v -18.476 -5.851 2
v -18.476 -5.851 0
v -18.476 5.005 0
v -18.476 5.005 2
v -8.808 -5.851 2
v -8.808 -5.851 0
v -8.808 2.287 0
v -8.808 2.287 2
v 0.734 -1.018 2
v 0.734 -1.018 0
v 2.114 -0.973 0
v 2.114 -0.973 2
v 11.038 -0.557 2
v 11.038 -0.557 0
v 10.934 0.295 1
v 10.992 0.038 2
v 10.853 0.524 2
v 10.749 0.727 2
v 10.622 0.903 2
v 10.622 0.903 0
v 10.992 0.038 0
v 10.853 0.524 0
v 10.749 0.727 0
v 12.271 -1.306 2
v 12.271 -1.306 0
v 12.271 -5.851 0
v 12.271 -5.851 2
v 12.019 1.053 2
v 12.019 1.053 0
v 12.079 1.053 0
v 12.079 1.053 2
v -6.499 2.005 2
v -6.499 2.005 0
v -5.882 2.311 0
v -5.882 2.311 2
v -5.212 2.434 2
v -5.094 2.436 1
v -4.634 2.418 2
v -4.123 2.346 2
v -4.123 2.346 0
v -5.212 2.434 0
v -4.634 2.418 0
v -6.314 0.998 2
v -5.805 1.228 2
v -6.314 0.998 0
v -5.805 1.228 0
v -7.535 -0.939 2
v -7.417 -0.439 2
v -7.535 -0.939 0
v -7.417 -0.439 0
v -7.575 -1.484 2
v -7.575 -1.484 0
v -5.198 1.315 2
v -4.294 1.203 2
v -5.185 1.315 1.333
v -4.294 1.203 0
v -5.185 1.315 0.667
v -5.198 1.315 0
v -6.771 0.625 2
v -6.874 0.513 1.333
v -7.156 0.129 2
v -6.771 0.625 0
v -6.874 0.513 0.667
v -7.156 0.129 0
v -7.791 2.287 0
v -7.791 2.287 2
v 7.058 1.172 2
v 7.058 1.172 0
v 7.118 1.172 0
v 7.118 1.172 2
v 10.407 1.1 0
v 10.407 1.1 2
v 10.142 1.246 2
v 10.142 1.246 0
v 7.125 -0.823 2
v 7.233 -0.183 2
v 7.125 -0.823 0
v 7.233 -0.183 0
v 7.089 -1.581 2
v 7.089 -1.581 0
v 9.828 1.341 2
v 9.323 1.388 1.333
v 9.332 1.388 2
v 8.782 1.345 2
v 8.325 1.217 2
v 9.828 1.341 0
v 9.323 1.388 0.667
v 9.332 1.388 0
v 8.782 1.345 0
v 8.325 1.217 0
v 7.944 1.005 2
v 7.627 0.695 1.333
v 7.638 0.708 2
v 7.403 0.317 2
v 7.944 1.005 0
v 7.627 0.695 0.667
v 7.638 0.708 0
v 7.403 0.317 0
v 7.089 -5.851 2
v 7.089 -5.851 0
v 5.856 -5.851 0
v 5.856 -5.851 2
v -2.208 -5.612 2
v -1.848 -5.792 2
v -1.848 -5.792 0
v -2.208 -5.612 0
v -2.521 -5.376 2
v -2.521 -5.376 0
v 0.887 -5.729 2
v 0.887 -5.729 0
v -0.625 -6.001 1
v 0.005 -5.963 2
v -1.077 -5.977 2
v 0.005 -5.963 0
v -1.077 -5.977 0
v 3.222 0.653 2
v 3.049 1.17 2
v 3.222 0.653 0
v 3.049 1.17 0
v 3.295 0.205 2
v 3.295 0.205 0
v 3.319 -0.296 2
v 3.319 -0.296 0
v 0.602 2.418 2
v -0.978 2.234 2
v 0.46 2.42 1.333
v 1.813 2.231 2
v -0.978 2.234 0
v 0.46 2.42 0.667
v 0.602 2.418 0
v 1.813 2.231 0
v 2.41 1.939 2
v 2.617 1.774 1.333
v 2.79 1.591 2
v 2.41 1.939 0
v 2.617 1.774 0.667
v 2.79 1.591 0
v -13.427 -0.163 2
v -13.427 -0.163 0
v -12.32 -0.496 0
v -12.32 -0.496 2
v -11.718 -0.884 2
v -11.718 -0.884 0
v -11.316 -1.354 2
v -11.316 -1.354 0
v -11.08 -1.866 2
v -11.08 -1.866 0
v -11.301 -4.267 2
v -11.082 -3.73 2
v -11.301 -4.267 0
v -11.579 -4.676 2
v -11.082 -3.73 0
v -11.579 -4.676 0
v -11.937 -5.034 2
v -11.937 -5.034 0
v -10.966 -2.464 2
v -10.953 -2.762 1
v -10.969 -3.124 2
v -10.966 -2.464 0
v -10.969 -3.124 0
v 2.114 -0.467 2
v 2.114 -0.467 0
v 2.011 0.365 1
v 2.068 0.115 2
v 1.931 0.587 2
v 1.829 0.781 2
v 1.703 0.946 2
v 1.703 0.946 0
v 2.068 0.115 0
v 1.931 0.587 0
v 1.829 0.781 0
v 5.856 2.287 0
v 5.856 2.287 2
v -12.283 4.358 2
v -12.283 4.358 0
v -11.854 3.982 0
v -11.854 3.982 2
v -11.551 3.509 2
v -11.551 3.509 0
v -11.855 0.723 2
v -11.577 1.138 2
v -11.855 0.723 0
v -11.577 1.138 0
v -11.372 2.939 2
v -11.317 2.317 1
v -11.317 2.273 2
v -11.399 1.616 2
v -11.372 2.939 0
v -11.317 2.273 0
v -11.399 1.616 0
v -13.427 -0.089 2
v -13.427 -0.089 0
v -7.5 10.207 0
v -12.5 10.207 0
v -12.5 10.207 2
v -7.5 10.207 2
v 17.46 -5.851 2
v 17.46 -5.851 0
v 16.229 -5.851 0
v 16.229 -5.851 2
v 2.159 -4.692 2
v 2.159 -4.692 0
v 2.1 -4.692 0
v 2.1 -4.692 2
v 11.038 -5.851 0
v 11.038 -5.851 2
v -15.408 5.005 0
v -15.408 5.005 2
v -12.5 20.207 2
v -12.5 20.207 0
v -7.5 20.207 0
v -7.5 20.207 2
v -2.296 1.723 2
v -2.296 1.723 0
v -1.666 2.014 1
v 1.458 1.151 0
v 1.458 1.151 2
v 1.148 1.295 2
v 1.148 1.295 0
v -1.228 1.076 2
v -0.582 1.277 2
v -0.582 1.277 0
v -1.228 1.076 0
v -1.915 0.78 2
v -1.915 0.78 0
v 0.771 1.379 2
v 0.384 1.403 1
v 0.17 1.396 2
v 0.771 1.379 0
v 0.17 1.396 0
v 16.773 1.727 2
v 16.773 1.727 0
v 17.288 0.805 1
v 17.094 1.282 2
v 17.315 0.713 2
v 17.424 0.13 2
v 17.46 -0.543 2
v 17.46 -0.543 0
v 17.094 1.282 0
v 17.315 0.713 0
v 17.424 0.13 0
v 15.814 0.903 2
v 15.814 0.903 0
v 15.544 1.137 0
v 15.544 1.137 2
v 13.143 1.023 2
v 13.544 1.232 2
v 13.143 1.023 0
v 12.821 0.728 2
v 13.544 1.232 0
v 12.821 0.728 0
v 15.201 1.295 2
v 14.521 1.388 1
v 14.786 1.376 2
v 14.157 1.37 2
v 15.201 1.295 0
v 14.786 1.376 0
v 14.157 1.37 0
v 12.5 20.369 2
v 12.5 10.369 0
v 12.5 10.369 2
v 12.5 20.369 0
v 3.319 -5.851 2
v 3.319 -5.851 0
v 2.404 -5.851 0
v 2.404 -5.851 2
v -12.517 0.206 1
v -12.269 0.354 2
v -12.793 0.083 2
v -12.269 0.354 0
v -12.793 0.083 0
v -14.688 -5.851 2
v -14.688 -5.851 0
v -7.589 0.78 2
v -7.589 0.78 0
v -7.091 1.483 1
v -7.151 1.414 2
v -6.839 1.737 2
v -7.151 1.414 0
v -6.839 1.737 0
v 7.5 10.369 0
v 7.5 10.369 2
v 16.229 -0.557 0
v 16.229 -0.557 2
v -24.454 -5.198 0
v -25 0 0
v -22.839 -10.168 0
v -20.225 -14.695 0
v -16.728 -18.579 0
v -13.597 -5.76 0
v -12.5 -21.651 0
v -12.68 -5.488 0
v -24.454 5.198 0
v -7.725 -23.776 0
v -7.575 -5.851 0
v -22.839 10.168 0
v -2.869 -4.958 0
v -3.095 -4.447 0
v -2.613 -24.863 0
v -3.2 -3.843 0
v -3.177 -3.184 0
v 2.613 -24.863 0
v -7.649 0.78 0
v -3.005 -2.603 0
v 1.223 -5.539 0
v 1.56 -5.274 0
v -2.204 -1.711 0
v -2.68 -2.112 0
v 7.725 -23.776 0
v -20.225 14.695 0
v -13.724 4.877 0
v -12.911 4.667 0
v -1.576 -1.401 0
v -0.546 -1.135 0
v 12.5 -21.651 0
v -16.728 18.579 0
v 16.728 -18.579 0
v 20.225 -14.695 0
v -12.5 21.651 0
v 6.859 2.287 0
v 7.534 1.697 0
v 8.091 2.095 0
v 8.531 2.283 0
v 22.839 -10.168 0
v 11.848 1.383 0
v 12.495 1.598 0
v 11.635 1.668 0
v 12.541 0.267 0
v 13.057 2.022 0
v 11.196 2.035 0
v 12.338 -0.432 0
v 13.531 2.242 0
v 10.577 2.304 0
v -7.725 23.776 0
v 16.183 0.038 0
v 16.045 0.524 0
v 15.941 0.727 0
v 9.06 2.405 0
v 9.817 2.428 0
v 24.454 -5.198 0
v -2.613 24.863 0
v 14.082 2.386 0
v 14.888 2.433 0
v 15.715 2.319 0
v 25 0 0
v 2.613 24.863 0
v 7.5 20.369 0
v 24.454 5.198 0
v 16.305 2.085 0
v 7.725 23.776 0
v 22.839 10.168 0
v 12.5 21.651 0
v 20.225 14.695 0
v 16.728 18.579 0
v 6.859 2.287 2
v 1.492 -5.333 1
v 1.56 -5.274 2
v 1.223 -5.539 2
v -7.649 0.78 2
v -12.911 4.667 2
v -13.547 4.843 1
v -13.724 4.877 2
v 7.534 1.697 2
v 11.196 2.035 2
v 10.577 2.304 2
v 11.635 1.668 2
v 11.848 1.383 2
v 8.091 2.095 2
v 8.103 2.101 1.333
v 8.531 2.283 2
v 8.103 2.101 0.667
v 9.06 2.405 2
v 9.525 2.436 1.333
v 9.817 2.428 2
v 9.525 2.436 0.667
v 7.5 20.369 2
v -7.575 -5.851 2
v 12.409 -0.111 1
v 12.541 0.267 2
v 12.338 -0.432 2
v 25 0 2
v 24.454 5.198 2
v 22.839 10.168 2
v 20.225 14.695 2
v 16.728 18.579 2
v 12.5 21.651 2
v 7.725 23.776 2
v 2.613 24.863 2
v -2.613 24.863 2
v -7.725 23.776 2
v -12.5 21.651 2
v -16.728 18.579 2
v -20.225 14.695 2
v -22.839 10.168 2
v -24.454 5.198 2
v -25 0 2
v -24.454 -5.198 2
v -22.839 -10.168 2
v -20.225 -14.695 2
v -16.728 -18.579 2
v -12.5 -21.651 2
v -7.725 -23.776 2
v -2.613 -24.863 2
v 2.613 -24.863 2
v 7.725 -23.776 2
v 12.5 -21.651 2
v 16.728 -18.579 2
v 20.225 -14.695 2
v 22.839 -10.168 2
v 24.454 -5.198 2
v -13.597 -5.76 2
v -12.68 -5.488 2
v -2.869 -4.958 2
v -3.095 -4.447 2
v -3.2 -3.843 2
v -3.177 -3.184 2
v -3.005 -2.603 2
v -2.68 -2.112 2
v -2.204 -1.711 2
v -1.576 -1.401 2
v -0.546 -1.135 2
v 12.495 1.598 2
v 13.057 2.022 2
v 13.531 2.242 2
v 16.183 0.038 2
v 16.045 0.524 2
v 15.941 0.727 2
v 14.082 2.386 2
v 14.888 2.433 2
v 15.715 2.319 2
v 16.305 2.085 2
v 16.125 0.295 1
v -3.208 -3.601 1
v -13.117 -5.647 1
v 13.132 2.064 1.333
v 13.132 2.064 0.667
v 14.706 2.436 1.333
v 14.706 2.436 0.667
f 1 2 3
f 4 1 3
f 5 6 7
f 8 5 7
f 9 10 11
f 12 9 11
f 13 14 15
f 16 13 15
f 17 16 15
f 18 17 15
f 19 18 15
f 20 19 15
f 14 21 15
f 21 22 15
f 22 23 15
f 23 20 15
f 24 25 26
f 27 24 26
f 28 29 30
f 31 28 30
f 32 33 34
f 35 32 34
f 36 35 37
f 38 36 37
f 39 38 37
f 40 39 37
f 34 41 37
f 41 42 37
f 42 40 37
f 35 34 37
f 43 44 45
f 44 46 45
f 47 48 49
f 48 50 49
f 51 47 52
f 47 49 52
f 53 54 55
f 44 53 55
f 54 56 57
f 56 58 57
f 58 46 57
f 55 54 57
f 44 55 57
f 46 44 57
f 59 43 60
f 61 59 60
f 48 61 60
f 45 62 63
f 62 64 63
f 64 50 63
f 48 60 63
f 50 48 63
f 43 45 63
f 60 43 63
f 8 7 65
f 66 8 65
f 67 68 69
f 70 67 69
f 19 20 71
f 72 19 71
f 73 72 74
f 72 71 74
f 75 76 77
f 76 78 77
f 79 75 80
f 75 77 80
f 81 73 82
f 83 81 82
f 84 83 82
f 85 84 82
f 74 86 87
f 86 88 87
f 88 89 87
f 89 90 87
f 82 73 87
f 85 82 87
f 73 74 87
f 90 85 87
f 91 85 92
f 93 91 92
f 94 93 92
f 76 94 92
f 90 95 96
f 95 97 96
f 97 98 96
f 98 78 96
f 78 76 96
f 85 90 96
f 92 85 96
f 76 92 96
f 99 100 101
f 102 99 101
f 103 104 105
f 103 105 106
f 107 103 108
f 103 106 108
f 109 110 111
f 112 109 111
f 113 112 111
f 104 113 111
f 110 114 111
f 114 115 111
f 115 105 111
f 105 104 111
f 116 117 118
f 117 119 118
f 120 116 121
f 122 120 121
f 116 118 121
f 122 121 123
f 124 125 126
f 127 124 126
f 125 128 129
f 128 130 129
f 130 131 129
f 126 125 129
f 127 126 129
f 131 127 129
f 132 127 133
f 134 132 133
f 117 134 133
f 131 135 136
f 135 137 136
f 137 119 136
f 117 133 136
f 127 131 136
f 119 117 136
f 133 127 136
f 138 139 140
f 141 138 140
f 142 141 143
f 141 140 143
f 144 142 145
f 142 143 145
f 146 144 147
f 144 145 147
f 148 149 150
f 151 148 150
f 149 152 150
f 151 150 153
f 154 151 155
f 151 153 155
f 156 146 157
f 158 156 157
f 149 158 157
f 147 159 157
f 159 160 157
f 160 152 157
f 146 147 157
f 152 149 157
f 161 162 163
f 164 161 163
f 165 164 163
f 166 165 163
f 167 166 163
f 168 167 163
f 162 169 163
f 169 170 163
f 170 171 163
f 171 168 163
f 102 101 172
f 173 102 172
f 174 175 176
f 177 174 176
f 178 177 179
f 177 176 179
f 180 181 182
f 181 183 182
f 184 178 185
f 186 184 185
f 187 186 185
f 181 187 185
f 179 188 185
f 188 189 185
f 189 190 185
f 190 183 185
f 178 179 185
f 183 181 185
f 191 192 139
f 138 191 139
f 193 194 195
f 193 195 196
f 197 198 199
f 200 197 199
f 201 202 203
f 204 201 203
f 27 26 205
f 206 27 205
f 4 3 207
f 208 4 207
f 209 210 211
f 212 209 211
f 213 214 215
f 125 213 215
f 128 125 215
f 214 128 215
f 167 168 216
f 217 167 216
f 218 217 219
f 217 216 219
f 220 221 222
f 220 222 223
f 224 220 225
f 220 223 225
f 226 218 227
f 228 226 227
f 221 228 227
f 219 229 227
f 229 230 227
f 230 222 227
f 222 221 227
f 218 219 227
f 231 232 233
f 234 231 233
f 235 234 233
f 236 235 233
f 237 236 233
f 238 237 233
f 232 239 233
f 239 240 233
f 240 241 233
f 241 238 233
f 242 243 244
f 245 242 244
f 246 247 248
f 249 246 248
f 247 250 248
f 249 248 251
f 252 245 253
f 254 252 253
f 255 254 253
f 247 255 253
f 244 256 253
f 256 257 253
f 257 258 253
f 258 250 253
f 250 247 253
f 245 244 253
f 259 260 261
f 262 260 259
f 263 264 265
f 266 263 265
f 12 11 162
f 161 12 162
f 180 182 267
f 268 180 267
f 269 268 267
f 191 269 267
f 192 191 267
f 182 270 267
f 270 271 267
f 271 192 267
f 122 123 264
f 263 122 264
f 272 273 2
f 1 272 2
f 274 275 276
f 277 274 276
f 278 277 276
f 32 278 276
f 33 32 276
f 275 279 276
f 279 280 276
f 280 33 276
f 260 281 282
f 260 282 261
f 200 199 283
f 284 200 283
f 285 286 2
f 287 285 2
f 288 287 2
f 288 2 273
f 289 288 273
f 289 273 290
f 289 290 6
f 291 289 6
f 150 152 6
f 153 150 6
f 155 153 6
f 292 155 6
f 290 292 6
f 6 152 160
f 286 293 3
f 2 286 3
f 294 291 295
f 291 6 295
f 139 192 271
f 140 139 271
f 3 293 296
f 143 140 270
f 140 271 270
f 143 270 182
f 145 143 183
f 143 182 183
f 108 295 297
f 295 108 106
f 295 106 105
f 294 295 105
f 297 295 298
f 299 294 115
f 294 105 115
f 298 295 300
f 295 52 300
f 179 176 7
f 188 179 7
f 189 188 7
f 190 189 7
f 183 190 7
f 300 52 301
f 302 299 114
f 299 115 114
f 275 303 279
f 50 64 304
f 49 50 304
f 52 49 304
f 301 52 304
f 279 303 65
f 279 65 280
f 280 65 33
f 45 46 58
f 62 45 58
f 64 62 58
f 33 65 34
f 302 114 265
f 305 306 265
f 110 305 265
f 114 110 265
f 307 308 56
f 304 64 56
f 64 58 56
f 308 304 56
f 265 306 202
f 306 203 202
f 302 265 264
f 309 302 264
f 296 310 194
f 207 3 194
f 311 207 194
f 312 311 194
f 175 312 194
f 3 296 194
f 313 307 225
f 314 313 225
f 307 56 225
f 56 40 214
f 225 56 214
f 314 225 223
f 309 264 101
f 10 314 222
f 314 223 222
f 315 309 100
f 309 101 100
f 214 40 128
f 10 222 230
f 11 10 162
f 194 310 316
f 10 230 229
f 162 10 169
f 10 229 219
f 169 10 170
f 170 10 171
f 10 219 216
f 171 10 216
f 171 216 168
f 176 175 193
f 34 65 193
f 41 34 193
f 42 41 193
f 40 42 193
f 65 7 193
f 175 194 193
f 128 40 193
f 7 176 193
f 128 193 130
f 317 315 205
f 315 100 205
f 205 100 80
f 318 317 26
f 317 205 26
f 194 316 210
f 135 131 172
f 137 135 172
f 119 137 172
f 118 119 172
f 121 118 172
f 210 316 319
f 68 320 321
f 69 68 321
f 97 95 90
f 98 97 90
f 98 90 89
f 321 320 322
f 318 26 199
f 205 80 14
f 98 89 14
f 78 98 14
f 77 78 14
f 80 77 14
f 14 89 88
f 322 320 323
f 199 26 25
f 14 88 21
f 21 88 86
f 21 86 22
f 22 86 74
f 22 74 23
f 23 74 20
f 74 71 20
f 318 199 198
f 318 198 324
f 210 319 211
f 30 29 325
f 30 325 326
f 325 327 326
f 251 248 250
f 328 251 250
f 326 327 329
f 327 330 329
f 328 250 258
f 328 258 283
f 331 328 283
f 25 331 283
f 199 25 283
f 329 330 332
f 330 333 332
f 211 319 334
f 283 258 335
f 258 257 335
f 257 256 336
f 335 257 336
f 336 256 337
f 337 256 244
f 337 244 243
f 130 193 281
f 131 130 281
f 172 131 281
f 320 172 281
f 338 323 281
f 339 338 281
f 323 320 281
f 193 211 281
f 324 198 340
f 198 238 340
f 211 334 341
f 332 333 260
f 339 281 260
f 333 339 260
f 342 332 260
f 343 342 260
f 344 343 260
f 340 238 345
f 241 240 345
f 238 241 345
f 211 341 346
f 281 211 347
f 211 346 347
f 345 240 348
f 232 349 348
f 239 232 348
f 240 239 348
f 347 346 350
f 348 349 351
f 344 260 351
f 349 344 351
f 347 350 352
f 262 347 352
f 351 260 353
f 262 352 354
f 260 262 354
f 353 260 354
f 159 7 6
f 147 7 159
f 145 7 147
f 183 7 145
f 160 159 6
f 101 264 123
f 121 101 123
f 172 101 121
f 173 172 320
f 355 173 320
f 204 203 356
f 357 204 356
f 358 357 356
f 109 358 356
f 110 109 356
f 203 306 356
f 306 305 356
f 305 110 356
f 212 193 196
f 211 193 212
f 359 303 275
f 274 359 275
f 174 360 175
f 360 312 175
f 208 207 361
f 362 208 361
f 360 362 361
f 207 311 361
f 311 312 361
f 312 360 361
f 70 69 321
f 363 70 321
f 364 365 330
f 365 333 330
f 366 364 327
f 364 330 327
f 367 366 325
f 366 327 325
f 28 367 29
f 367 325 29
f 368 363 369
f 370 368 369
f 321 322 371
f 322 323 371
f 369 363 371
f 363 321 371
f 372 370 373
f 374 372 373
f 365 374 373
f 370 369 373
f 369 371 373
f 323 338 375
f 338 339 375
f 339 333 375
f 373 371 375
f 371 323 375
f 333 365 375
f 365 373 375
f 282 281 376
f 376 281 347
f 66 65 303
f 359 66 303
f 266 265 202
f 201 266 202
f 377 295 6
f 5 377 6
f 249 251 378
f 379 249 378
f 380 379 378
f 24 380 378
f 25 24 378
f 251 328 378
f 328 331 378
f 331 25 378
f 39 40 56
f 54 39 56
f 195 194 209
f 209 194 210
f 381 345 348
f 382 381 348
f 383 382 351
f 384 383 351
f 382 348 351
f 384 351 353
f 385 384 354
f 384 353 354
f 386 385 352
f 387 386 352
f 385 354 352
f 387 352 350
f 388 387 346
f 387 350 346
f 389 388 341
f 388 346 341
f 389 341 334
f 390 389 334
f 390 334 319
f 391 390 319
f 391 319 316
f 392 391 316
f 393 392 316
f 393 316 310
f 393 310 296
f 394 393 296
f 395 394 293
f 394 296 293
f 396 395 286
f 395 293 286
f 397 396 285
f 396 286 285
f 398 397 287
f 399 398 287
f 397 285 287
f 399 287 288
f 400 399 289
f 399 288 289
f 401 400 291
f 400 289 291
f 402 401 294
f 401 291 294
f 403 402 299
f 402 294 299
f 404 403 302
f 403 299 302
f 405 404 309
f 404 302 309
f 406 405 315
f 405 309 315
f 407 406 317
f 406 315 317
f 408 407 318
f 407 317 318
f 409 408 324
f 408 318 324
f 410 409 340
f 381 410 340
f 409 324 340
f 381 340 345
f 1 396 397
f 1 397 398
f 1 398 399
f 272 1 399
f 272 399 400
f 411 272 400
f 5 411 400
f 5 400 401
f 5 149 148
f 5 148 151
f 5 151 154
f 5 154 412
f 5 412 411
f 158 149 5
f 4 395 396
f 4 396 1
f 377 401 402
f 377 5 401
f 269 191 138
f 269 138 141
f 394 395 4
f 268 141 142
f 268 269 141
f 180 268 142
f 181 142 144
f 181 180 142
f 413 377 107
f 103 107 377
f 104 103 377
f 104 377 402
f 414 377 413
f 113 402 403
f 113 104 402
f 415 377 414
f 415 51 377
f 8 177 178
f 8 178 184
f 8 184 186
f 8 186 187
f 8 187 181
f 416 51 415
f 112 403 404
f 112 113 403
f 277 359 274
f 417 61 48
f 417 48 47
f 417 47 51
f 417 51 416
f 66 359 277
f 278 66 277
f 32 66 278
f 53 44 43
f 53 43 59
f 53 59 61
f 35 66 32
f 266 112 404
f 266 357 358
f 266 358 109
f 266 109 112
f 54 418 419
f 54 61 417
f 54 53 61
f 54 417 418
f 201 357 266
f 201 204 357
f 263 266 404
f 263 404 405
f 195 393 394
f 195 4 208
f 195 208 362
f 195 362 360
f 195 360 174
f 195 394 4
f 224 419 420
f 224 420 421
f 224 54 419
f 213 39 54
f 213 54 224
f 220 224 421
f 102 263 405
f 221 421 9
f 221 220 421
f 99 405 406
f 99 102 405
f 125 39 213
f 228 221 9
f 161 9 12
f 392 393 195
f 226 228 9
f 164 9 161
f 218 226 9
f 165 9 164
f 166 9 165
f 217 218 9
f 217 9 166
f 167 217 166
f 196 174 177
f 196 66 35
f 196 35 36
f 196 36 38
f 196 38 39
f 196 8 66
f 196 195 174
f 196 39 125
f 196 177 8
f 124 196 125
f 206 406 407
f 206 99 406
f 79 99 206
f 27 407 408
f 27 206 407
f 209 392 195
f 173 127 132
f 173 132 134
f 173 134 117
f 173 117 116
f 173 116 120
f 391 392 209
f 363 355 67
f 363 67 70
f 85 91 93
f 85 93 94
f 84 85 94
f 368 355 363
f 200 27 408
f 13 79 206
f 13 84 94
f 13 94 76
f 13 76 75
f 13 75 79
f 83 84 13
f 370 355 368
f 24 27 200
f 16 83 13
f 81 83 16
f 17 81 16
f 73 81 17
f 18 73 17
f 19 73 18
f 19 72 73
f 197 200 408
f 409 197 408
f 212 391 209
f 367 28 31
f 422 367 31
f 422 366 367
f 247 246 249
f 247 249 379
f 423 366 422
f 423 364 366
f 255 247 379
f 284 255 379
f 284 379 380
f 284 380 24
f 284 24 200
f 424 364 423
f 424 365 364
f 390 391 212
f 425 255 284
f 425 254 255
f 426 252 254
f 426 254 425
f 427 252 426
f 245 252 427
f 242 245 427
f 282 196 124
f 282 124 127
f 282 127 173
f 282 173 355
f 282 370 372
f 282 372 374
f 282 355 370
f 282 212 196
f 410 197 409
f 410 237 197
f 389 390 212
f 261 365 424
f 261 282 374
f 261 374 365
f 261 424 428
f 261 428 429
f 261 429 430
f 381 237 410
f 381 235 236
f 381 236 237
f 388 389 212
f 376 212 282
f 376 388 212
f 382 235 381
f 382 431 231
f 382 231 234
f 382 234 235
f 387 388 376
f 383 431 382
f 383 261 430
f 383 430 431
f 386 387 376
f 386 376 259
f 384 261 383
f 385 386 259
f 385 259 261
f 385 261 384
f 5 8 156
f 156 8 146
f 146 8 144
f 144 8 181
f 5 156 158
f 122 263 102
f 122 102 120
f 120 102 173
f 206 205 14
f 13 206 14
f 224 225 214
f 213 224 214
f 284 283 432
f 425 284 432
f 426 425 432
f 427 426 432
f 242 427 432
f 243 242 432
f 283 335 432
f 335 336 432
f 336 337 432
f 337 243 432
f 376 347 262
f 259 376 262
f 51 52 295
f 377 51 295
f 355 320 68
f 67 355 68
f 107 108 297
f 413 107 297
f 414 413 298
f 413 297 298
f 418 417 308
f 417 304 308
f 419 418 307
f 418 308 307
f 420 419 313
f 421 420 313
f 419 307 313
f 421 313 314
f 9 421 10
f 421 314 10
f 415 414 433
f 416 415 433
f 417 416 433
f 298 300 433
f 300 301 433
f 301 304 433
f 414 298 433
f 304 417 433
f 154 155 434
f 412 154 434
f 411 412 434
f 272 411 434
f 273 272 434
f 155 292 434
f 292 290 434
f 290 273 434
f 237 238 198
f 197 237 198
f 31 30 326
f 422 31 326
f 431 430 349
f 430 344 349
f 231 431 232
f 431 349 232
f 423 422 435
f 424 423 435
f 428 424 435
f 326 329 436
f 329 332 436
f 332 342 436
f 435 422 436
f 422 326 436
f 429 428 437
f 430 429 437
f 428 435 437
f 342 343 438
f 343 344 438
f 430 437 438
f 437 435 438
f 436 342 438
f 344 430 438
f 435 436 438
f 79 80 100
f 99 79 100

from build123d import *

# Parameters (mm, degrees)
F0_R     = 25
F0_W     = 5
F0_H     = 10
F1_DEPTH = 2


with BuildPart() as f1:
    # F0 (on Top) → F1 (new body)
    with BuildSketch(Plane.XY):
        Circle(F0_R)
        with BuildLine():
            Line((-18.475540486, -5.8509828523), (-18.475540486, 5.0045425299))
            Line((-18.475540486, 5.0045425299), (-15.4082427691, 5.0045425299))
            add(Edge.make_bspline(
                [(-15.4082427691, 5.0045425299), (-13.2485420529, 5.0045425299), (-12.2827352969, 4.3582954509)],
                knots=[0, 0, 0, 1, 1, 1], degree=2))
            add(Edge.make_bspline(
                [(-12.2827352969, 4.3582954509), (-11.316928541, 3.7120483719), (-11.316928541, 2.3173901536)],
                knots=[0, 0, 0, 1, 1, 1], degree=2))
            add(Edge.make_bspline(
                [(-11.316928541, 2.3173901536), (-11.316928541, 1.3503954435), (-11.8550717888, 0.7231556315)],
                knots=[0, 0, 0, 1, 1, 1], degree=2))
            add(Edge.make_bspline(
                [(-11.8550717888, 0.7231556315), (-12.3932150366, 0.0959158196), (-13.4267351813, -0.089405034)],
                knots=[0, 0, 0, 1, 1, 1], degree=2))
            Line((-13.4267351813, -0.089405034), (-13.4267351813, -0.1630581937))
            add(Edge.make_bspline(
                [(-13.4267351813, -0.1630581937), (-10.9534145591, -0.5859698851), (-10.9534145591, -2.76230196)],
                knots=[0, 0, 0, 1, 1, 1], degree=2))
            add(Edge.make_bspline(
                [(-10.9534145591, -2.76230196), (-10.9534145591, -4.2163578877), (-11.9370406278, -5.03367037)],
                knots=[0, 0, 0, 1, 1, 1], degree=2))
            add(Edge.make_bspline(
                [(-11.9370406278, -5.03367037), (-12.9206666966, -5.8509828523), (-14.6883425304, -5.8509828523)],
                knots=[0, 0, 0, 1, 1, 1], degree=2))
            Line((-14.6883425304, -5.8509828523), (-18.475540486, -5.8509828523))
        make_face(mode=Mode.SUBTRACT)
        with BuildLine():
            add(Edge.make_bspline(
                [(-6.4985863491, 2.0049582018), (-5.8594669952, 2.4361855726), (-5.0944244973, 2.4361855726)],
                knots=[0, 0, 0, 1, 1, 1], degree=2))
            add(Edge.make_bspline(
                [(-5.0944244973, 2.4361855726), (-4.5527173869, 2.4361855726), (-4.1226779704, 2.3459010542)],
                knots=[0, 0, 0, 1, 1, 1], degree=2))
            Line((-4.1226779704, 2.3459010542), (-4.2937433736, 1.203089124))
            add(Edge.make_bspline(
                [(-4.2937433736, 1.203089124), (-4.7974359499, 1.3147568178), (-5.1847090156, 1.3147568178)],
                knots=[0, 0, 0, 1, 1, 1], degree=2))
            add(Edge.make_bspline(
                [(-5.1847090156, 1.3147568178), (-6.1730869012, 1.3147568178), (-6.8739798729, 0.51288774)],
                knots=[0, 0, 0, 1, 1, 1], degree=2))
            add(Edge.make_bspline(
                [(-6.8739798729, 0.51288774), (-7.5748728446, -0.2889813378), (-7.5748728446, -1.4840632523)],
                knots=[0, 0, 0, 1, 1, 1], degree=2))
            Line((-7.5748728446, -1.4840632523), (-7.5748728446, -5.8509828523))
            Line((-7.5748728446, -5.8509828523), (-8.8079692931, -5.8509828523))
            Line((-8.8079692931, -5.8509828523), (-8.8079692931, 2.2865033447))
            Line((-8.8079692931, 2.2865033447), (-7.7910805071, 2.2865033447))
            Line((-7.7910805071, 2.2865033447), (-7.6485260043, 0.7801774326))
            Line((-7.6485260043, 0.7801774326), (-7.5891282949, 0.7801774326))
            add(Edge.make_bspline(
                [(-7.5891282949, 0.7801774326), (-7.1377057029, 1.5737308311), (-6.4985863491, 2.0049582018)],
                knots=[0, 0, 0, 1, 1, 1], degree=2))
        make_face(mode=Mode.SUBTRACT)
        with BuildLine():
            Line((3.3186670717, -5.8509828523), (2.4039423459, -5.8509828523))
            Line((2.4039423459, -5.8509828523), (2.1592237829, -4.6915395635))
            Line((2.1592237829, -4.6915395635), (2.0998260734, -4.6915395635))
            add(Edge.make_bspline(
                [(2.0998260734, -4.6915395635), (1.4915935284, -5.4565820614), (0.8869248461, -5.7286235708)],
                knots=[0, 0, 0, 1, 1, 1], degree=2))
            add(Edge.make_bspline(
                [(0.8869248461, -5.7286235708), (0.2822561637, -6.0006650801), (-0.625340837, -6.0006650801)],
                knots=[0, 0, 0, 1, 1, 1], degree=2))
            add(Edge.make_bspline(
                [(-0.625340837, -6.0006650801), (-1.8346782017, -6.0006650801), (-2.5213157231, -5.3758011765)],
                knots=[0, 0, 0, 1, 1, 1], degree=2))
            add(Edge.make_bspline(
                [(-2.5213157231, -5.3758011765), (-3.2079532446, -4.750937273), (-3.2079532446, -3.6009976177)],
                knots=[0, 0, 0, 1, 1, 1], degree=2))
            add(Edge.make_bspline(
                [(-3.2079532446, -3.6009976177), (-3.2079532446, -1.137180629), (0.7336787556, -1.01838521)],
                knots=[0, 0, 0, 1, 1, 1], degree=2))
            Line((0.7336787556, -1.01838521), (2.1140815237, -0.9732429509))
            Line((2.1140815237, -0.9732429509), (2.1140815237, -0.4671744662))
            add(Edge.make_bspline(
                [(2.1140815237, -0.4671744662), (2.1140815237, 0.4903166104), (1.7030493742, 0.9464910191)],
                knots=[0, 0, 0, 1, 1, 1], degree=2))
            add(Edge.make_bspline(
                [(1.7030493742, 0.9464910191), (1.2920172246, 1.4026654278), (0.384420224, 1.4026654278)],
                knots=[0, 0, 0, 1, 1, 1], degree=2))
            add(Edge.make_bspline(
                [(0.384420224, 1.4026654278), (-0.6324685621, 1.4026654278), (-1.9154590866, 0.7801774326)],
                knots=[0, 0, 0, 1, 1, 1], degree=2))
            Line((-1.9154590866, 0.7801774326), (-2.2956044272, 1.723413059))
            add(Edge.make_bspline(
                [(-2.2956044272, 1.723413059), (-1.6944996074, 2.0489125068), (-0.9781632312, 2.2342333604)],
                knots=[0, 0, 0, 1, 1, 1], degree=2))
            add(Edge.make_bspline(
                [(-0.9781632312, 2.2342333604), (-0.261826855, 2.4195542139), (0.4604492921, 2.4195542139)],
                knots=[0, 0, 0, 1, 1, 1], degree=2))
            add(Edge.make_bspline(
                [(0.4604492921, 2.4195542139), (1.9145052199, 2.4195542139), (2.6165861458, 1.7744950891)],
                knots=[0, 0, 0, 1, 1, 1], degree=2))
            add(Edge.make_bspline(
                [(2.6165861458, 1.7744950891), (3.3186670717, 1.1294359643), (3.3186670717, -0.2961090629)],
                knots=[0, 0, 0, 1, 1, 1], degree=2))
            Line((3.3186670717, -0.2961090629), (3.3186670717, -5.8509828523))
        make_face(mode=Mode.SUBTRACT)
        with BuildLine():
            Line((17.4600737416, -5.8509828523), (16.2293532014, -5.8509828523))
            Line((16.2293532014, -5.8509828523), (16.2293532014, -0.5574589846))
            add(Edge.make_bspline(
                [(16.2293532014, -0.5574589846), (16.2293532014, 0.4166634507), (15.8135692351, 0.9025367141)],
                knots=[0, 0, 0, 1, 1, 1], degree=2))
            add(Edge.make_bspline(
                [(15.8135692351, 0.9025367141), (15.3977852689, 1.3884099776), (14.5210750771, 1.3884099776)],
                knots=[0, 0, 0, 1, 1, 1], degree=2))
            add(Edge.make_bspline(
                [(14.5210750771, 1.3884099776), (13.3711354218, 1.3884099776), (12.8211126322, 0.7279074483)],
                knots=[0, 0, 0, 1, 1, 1], degree=2))
            add(Edge.make_bspline(
                [(12.8211126322, 0.7279074483), (12.2710898425, 0.067404919), (12.2710898425, -1.3058701239)],
                knots=[0, 0, 0, 1, 1, 1], degree=2))
            Line((12.2710898425, -1.3058701239), (12.2710898425, -5.8509828523))
            Line((12.2710898425, -5.8509828523), (11.037993394, -5.8509828523))
            Line((11.037993394, -5.8509828523), (11.037993394, -0.5574589846))
            add(Edge.make_bspline(
                [(11.037993394, -0.5574589846), (11.037993394, 0.4166634507), (10.6222094277, 0.9025367141)],
                knots=[0, 0, 0, 1, 1, 1], degree=2))
            add(Edge.make_bspline(
                [(10.6222094277, 0.9025367141), (10.2064254614, 1.3884099776), (9.3225875446, 1.3884099776)],
                knots=[0, 0, 0, 1, 1, 1], degree=2))
            add(Edge.make_bspline(
                [(9.3225875446, 1.3884099776), (8.1655201642, 1.3884099776), (7.6273769164, 0.694644731)],
                knots=[0, 0, 0, 1, 1, 1], degree=2))
            add(Edge.make_bspline(
                [(7.6273769164, 0.694644731), (7.0892336686, 0.0008794844), (7.0892336686, -1.5814754958)],
                knots=[0, 0, 0, 1, 1, 1], degree=2))
            Line((7.0892336686, -1.5814754958), (7.0892336686, -5.8509828523))
            Line((7.0892336686, -5.8509828523), (5.8561372201, -5.8509828523))
            Line((5.8561372201, -5.8509828523), (5.8561372201, 2.2865033447))
            Line((5.8561372201, 2.2865033447), (6.8587705559, 2.2865033447))
            Line((6.8587705559, 2.2865033447), (7.0583468597, 1.1722023151))
            Line((7.0583468597, 1.1722023151), (7.1177445692, 1.1722023151))
            add(Edge.make_bspline(
                [(7.1177445692, 1.1722023151), (7.4670031008, 1.7661794098), (8.1025585921, 2.1011824912)],
                knots=[0, 0, 0, 1, 1, 1], degree=2))
            add(Edge.make_bspline(
                [(8.1025585921, 2.1011824912), (8.7381140834, 2.4361855726), (9.5245397568, 2.4361855726)],
                knots=[0, 0, 0, 1, 1, 1], degree=2))
            add(Edge.make_bspline(
                [(9.5245397568, 2.4361855726), (11.4323941848, 2.4361855726), (12.0192435544, 1.0534068962)],
                knots=[0, 0, 0, 1, 1, 1], degree=2))
            Line((12.0192435544, 1.0534068962), (12.0786412638, 1.0534068962))
            add(Edge.make_bspline(
                [(12.0786412638, 1.0534068962), (12.4421552458, 1.69252625), (13.1323566298, 2.0643559113)],
                knots=[0, 0, 0, 1, 1, 1], degree=2))
            add(Edge.make_bspline(
                [(13.1323566298, 2.0643559113), (13.8225580138, 2.4361855726), (14.7063959307, 2.4361855726)],
                knots=[0, 0, 0, 1, 1, 1], degree=2))
            add(Edge.make_bspline(
                [(14.7063959307, 2.4361855726), (16.0867986987, 2.4361855726), (16.7734362201, 1.7269769215)],
                knots=[0, 0, 0, 1, 1, 1], degree=2))
            add(Edge.make_bspline(
                [(16.7734362201, 1.7269769215), (17.4600737416, 1.0177682705), (17.4600737416, -0.5432035343)],
                knots=[0, 0, 0, 1, 1, 1], degree=2))
            Line((17.4600737416, -0.5432035343), (17.4600737416, -5.8509828523))
        make_face(mode=Mode.SUBTRACT)
        with Locations((-10, 15.2066518739)):
            Rectangle(F0_W, F0_H, mode=Mode.SUBTRACT)
        with Locations((10, 15.3693027049)):
            Rectangle(F0_W, F0_H, mode=Mode.SUBTRACT)
    extrude(amount=F1_DEPTH)


solid = f1.part
